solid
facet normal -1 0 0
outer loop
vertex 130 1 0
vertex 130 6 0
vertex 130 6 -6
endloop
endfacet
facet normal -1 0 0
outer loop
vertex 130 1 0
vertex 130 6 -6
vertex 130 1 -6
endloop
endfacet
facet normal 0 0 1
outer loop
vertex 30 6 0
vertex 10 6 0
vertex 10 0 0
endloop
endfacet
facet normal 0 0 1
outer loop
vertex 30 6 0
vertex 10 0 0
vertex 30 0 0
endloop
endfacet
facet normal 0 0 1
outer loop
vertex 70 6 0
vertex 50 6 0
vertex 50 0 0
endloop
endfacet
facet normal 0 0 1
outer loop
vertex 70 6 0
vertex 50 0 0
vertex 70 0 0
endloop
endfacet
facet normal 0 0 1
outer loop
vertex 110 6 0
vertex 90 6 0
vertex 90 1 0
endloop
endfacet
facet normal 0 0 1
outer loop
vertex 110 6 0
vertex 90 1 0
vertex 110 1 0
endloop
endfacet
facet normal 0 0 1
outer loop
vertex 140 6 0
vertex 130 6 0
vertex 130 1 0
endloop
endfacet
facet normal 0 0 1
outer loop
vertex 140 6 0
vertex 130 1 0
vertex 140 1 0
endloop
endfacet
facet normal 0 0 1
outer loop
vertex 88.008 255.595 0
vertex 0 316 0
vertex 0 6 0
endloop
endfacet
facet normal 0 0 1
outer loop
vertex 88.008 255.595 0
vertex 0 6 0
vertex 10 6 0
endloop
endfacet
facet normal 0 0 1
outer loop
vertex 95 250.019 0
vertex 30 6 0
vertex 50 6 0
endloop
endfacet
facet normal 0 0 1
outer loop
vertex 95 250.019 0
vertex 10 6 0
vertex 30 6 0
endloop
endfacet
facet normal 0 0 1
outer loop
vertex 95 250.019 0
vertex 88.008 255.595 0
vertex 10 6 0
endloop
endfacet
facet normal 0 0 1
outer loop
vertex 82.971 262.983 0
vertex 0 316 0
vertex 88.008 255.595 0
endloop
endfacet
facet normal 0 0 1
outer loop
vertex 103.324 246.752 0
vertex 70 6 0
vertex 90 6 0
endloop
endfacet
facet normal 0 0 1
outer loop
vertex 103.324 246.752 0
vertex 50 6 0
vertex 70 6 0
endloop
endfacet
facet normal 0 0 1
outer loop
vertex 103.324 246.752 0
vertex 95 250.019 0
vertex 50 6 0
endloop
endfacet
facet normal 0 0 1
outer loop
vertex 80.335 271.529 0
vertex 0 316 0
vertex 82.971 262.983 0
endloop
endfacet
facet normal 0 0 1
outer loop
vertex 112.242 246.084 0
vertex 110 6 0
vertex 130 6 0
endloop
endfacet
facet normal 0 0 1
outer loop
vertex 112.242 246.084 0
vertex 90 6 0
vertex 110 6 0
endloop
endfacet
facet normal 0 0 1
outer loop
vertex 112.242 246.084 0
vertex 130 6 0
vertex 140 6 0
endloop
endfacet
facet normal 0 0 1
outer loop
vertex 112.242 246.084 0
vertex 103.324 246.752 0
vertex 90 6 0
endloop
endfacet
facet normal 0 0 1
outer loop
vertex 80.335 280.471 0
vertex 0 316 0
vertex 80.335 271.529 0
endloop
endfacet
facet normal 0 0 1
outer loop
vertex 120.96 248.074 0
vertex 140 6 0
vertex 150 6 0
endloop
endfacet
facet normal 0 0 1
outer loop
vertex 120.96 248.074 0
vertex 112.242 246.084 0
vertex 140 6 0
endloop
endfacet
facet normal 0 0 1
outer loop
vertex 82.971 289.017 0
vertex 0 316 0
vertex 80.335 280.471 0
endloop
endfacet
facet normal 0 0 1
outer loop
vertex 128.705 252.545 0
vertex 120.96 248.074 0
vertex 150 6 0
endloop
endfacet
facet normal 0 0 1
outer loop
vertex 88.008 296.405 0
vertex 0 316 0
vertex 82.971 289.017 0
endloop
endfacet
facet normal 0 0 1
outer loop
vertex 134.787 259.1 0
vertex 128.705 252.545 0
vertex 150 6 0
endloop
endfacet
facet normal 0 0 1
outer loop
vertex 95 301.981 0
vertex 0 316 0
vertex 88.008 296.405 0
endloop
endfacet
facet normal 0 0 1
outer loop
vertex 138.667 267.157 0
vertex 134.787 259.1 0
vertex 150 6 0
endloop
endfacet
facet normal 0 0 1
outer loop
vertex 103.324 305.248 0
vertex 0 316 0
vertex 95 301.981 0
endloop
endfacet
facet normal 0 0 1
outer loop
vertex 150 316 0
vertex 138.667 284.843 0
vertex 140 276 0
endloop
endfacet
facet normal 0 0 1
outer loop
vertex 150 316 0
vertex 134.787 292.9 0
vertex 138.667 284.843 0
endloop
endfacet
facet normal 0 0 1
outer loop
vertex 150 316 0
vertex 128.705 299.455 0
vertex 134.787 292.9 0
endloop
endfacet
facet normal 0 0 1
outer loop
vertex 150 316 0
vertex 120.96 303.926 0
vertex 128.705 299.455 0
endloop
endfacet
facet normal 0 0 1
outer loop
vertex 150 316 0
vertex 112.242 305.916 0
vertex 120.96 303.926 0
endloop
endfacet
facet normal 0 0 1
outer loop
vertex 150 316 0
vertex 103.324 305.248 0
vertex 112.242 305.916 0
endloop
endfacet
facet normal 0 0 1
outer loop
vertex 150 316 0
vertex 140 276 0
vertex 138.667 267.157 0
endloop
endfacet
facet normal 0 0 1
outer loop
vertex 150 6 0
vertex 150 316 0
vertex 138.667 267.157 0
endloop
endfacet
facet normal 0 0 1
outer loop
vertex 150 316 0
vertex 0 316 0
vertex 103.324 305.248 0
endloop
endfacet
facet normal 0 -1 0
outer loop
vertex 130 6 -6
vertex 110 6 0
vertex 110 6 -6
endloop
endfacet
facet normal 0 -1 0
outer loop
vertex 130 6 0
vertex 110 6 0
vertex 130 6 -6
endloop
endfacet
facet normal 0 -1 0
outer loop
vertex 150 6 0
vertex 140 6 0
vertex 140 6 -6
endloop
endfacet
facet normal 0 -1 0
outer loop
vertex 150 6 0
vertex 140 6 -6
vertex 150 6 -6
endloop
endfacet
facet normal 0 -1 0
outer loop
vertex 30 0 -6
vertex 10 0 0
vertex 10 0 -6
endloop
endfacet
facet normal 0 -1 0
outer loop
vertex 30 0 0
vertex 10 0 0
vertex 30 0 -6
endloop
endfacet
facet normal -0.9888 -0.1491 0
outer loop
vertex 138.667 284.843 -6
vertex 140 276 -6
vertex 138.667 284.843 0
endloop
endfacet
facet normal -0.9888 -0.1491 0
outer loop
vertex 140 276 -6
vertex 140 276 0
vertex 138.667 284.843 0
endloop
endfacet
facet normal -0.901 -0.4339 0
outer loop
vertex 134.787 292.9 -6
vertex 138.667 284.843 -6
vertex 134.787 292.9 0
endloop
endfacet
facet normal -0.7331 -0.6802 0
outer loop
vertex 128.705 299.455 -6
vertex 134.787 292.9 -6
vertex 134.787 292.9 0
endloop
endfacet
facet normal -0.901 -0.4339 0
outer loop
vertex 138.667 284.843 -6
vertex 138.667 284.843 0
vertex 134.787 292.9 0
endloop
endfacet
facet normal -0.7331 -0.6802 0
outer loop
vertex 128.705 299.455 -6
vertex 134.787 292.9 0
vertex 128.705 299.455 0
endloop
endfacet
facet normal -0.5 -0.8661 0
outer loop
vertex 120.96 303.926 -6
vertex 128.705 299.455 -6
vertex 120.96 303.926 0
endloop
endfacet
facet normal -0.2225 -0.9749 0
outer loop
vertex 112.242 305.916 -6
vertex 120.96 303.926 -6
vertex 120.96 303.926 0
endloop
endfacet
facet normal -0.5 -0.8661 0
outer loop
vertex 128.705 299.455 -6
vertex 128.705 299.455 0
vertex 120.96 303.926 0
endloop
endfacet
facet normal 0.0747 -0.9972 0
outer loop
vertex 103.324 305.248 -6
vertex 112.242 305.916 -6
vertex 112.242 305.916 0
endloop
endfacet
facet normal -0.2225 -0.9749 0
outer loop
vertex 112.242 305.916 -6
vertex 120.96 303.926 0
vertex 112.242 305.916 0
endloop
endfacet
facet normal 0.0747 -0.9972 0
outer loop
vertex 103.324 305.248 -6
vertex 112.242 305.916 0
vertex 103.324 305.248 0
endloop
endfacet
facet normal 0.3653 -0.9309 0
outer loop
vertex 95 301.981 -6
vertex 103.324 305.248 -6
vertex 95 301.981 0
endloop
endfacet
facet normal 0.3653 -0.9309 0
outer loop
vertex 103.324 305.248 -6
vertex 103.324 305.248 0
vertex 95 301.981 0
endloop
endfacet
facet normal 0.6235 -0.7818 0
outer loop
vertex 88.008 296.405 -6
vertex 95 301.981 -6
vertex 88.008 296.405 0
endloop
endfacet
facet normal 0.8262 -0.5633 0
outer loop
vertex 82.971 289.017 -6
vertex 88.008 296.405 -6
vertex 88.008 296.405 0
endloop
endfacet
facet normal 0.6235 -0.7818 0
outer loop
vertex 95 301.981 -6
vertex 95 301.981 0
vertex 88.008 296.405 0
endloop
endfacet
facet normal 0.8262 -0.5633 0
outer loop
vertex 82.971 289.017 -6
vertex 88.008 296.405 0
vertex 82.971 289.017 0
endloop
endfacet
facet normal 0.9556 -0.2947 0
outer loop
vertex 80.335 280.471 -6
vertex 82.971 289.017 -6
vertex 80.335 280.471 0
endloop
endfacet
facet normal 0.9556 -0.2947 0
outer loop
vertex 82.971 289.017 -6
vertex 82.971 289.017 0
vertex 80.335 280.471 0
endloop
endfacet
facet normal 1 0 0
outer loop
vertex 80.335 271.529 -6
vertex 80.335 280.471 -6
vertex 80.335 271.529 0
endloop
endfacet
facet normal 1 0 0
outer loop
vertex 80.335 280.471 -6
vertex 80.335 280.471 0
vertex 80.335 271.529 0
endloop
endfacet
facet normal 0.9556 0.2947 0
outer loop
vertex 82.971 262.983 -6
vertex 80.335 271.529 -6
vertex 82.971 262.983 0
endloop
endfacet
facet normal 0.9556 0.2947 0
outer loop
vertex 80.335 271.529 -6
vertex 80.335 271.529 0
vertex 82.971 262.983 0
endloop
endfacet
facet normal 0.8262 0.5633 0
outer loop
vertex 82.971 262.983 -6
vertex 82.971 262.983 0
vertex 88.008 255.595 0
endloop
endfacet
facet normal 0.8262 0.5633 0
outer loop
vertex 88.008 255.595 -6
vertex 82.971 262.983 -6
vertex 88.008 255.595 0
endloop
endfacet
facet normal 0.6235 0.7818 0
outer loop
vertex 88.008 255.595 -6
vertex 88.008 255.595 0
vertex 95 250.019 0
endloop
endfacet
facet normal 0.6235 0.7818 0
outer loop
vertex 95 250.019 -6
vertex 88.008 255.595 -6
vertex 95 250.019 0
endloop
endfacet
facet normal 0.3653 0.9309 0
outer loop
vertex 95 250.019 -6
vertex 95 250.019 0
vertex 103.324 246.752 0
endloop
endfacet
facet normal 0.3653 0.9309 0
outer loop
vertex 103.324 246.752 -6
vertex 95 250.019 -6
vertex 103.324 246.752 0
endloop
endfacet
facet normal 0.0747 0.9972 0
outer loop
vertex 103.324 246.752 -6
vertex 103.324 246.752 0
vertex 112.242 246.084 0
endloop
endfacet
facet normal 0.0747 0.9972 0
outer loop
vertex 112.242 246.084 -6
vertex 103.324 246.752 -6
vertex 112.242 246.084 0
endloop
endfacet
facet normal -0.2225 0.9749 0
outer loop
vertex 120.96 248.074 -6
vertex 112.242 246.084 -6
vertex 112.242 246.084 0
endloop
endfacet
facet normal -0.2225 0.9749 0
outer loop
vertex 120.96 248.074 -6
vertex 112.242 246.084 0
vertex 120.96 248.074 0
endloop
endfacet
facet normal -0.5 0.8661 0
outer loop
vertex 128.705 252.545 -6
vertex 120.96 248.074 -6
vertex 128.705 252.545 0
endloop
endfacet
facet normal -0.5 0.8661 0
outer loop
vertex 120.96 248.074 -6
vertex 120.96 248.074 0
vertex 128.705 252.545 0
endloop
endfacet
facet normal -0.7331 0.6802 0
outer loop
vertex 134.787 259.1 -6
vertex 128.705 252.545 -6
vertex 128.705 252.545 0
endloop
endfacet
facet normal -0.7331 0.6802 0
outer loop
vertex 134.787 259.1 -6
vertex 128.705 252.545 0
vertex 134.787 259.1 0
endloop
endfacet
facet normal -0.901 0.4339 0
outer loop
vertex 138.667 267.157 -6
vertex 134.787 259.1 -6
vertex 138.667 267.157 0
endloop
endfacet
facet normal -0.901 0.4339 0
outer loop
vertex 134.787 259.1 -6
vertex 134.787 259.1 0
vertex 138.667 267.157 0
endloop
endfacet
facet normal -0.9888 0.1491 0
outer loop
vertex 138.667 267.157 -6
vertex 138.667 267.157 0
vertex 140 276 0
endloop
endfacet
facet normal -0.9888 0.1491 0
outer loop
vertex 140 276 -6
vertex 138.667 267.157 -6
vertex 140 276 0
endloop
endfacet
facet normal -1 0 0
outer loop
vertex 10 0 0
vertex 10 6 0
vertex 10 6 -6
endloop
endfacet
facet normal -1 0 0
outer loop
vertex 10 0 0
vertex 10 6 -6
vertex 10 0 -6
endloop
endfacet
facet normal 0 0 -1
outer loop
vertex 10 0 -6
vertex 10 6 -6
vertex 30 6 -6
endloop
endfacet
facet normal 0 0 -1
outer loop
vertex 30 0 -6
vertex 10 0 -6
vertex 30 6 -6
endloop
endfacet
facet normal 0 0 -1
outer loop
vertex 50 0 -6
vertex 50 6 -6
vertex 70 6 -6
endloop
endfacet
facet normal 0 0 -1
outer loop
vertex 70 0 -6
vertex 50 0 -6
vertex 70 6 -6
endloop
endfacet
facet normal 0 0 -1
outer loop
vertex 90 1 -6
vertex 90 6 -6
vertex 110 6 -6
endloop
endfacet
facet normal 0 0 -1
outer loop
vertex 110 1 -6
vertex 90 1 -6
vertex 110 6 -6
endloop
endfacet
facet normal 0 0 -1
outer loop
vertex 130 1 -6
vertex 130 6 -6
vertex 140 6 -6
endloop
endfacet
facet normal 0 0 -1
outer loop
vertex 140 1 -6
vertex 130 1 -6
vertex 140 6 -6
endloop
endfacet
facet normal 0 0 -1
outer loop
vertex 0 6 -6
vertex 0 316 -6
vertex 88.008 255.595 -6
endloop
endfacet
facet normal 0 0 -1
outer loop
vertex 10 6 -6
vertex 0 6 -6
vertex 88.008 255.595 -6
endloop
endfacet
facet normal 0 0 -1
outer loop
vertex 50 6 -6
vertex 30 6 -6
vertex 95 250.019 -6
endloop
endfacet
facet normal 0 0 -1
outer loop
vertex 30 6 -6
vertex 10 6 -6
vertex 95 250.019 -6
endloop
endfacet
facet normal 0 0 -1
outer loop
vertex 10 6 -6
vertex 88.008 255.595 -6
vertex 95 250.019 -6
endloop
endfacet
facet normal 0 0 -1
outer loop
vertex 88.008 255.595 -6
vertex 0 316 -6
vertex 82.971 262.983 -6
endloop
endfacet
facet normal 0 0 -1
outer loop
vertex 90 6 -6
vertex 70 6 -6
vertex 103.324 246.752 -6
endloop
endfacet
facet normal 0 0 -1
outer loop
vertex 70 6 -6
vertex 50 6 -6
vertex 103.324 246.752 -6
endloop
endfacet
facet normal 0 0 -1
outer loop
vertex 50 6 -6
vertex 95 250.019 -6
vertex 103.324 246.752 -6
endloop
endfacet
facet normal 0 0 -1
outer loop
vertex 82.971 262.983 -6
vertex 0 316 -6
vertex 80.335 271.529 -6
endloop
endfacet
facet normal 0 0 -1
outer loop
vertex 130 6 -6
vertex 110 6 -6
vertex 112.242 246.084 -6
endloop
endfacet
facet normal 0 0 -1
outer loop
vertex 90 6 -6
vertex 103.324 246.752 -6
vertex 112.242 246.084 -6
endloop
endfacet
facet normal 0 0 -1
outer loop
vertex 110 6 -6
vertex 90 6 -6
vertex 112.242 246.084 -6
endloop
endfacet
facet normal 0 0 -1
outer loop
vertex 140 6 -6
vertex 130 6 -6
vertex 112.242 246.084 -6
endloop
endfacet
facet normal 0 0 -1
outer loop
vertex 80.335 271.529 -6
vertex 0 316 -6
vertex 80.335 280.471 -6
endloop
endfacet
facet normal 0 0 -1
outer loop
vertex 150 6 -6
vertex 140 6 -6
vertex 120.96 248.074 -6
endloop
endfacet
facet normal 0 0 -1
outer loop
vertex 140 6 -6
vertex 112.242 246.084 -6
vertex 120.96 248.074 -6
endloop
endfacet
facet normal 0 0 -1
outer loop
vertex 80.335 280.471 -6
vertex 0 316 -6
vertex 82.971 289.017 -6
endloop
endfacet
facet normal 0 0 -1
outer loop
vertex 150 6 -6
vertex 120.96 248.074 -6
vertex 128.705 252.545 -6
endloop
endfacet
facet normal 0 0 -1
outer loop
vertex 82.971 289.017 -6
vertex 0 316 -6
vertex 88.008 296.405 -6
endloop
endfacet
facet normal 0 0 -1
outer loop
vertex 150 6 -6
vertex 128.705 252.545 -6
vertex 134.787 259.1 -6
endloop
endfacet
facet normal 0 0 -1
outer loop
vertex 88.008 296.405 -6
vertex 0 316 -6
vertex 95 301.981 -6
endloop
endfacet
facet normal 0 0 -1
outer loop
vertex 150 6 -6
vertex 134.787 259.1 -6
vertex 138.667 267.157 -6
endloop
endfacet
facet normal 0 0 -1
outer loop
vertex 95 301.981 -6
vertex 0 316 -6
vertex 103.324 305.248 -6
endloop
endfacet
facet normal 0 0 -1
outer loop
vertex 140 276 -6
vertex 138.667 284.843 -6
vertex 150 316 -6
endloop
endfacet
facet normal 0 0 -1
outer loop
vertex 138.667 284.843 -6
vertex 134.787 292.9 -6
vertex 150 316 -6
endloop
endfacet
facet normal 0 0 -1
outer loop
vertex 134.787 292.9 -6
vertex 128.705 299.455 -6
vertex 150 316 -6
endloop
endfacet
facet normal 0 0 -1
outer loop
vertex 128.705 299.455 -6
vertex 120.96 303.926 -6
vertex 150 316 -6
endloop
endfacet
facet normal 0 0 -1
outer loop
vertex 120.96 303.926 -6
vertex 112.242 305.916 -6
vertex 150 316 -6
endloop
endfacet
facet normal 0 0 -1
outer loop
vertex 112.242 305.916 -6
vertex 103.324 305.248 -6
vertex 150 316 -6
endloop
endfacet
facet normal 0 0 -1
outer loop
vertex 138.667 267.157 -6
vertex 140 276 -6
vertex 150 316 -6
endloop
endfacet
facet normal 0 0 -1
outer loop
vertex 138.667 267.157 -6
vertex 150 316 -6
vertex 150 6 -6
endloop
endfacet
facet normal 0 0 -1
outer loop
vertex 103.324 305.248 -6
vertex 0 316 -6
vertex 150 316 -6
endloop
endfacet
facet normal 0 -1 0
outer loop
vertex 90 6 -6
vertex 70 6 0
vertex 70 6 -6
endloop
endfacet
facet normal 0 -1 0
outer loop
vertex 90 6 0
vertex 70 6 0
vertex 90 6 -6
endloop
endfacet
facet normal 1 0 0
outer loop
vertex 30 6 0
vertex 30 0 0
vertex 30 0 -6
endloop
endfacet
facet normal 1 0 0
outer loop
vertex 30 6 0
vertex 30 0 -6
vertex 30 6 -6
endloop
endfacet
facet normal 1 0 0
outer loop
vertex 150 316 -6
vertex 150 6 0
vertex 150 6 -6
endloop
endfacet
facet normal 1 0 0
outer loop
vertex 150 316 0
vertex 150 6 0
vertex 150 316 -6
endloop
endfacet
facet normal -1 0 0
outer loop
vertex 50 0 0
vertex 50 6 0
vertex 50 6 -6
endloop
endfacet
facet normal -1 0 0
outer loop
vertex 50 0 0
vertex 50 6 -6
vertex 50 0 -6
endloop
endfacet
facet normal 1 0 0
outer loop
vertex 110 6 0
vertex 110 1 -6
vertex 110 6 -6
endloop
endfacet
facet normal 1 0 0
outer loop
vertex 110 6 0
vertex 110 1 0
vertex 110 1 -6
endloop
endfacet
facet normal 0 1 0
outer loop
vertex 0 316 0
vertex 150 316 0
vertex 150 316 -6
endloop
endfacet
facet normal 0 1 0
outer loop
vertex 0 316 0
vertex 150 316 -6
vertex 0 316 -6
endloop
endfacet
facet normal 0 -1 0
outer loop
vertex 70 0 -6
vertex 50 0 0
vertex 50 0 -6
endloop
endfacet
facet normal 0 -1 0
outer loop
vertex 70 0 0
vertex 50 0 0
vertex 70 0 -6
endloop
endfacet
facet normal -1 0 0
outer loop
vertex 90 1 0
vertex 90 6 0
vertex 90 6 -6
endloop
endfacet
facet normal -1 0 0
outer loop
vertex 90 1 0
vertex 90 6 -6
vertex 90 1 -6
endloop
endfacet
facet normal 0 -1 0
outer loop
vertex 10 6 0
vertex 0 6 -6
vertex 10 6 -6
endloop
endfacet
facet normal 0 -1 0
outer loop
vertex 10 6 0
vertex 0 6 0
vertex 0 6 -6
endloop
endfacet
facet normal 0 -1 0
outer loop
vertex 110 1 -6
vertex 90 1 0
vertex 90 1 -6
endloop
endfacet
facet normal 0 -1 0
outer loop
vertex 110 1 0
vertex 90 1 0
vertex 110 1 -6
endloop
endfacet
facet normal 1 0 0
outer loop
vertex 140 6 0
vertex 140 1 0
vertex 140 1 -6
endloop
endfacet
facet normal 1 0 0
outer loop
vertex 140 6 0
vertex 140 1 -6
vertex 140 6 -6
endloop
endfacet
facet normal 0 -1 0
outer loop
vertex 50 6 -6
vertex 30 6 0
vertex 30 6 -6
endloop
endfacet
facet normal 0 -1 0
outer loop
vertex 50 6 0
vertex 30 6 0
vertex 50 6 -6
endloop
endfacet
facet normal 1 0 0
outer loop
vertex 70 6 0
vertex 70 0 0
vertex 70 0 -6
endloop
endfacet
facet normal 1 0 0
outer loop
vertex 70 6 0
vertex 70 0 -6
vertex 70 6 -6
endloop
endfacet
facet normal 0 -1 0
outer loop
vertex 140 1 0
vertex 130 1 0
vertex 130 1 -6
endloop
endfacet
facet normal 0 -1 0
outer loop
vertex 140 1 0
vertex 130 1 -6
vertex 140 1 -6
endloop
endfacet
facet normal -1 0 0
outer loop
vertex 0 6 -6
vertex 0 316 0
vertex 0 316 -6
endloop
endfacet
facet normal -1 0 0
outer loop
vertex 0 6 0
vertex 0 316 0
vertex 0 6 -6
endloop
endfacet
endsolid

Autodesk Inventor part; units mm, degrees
ref_plane "YZ Plane" through (0, 0, 0) normal (1, 0, 0) x (0, 1, 0)
ref_plane "XZ Plane" through (0, 0, 0) normal (0, 1, 0) x (-1, 0, 0)
ref_plane "XY Plane" through (0, 0, 0) normal (0, 0, 1) x (1, 0, 0)
sketch "Sketch1" plane through (0, 0, 0) normal (0, 0, 1) x (1, 0, 0)
  line L0 (0, 0) -> (0, 6)
  line L1 (0, 6) -> (10, 6)
  line L2 (10, 6) -> (10, 0)
  line L3 (10, 0) -> (30, 0)
  line L4 (30, 0) -> (30, 6)
  line L5 (30, 6) -> (50, 6)
  line L6 (50, 6) -> (50, 0)
  line L7 (50, 0) -> (70, 0)
  line L8 (70, 0) -> (70, 6)
  line L9 (70, 6) -> (90, 6)
  line L10 (90, 6) -> (90, 1)
  line L11 (90, 1) -> (110, 1)
  line L12 (110, 1) -> (110, 6)
  line L13 (110, 6) -> (130, 6)
  line L14 (130, 6) -> (130, 1)
  line L15 (130, 1) -> (140, 1)
  line L16 (140, 1) -> (140, 6)
  line L17 (140, 6) -> (150, 6)
  line L18 (150, 6) -> (150, 316)
  line L19 (150, 316) -> (0, 316)
  line L20 (0, 316) -> (0, 6)
  circle A0 centre (110, 276) radius 30
  dimension "d0" = 6
  dimension "d1" = 10
  dimension "d2" = 20
  dimension "d3" = 20
  dimension "d4" = 20
  dimension "d5" = 20
  dimension "d6" = 20
  dimension "d7" = 20
  dimension "d8" = 10
  dimension "d9" = 10
  dimension "d10" = 310
  dimension "d13" = 60
  dimension "d14" = 40
  dimension "d16" = 40
extrude "Extrusion1" add sketch "Sketch1" against normal blind 6
properties part number "Exit"
